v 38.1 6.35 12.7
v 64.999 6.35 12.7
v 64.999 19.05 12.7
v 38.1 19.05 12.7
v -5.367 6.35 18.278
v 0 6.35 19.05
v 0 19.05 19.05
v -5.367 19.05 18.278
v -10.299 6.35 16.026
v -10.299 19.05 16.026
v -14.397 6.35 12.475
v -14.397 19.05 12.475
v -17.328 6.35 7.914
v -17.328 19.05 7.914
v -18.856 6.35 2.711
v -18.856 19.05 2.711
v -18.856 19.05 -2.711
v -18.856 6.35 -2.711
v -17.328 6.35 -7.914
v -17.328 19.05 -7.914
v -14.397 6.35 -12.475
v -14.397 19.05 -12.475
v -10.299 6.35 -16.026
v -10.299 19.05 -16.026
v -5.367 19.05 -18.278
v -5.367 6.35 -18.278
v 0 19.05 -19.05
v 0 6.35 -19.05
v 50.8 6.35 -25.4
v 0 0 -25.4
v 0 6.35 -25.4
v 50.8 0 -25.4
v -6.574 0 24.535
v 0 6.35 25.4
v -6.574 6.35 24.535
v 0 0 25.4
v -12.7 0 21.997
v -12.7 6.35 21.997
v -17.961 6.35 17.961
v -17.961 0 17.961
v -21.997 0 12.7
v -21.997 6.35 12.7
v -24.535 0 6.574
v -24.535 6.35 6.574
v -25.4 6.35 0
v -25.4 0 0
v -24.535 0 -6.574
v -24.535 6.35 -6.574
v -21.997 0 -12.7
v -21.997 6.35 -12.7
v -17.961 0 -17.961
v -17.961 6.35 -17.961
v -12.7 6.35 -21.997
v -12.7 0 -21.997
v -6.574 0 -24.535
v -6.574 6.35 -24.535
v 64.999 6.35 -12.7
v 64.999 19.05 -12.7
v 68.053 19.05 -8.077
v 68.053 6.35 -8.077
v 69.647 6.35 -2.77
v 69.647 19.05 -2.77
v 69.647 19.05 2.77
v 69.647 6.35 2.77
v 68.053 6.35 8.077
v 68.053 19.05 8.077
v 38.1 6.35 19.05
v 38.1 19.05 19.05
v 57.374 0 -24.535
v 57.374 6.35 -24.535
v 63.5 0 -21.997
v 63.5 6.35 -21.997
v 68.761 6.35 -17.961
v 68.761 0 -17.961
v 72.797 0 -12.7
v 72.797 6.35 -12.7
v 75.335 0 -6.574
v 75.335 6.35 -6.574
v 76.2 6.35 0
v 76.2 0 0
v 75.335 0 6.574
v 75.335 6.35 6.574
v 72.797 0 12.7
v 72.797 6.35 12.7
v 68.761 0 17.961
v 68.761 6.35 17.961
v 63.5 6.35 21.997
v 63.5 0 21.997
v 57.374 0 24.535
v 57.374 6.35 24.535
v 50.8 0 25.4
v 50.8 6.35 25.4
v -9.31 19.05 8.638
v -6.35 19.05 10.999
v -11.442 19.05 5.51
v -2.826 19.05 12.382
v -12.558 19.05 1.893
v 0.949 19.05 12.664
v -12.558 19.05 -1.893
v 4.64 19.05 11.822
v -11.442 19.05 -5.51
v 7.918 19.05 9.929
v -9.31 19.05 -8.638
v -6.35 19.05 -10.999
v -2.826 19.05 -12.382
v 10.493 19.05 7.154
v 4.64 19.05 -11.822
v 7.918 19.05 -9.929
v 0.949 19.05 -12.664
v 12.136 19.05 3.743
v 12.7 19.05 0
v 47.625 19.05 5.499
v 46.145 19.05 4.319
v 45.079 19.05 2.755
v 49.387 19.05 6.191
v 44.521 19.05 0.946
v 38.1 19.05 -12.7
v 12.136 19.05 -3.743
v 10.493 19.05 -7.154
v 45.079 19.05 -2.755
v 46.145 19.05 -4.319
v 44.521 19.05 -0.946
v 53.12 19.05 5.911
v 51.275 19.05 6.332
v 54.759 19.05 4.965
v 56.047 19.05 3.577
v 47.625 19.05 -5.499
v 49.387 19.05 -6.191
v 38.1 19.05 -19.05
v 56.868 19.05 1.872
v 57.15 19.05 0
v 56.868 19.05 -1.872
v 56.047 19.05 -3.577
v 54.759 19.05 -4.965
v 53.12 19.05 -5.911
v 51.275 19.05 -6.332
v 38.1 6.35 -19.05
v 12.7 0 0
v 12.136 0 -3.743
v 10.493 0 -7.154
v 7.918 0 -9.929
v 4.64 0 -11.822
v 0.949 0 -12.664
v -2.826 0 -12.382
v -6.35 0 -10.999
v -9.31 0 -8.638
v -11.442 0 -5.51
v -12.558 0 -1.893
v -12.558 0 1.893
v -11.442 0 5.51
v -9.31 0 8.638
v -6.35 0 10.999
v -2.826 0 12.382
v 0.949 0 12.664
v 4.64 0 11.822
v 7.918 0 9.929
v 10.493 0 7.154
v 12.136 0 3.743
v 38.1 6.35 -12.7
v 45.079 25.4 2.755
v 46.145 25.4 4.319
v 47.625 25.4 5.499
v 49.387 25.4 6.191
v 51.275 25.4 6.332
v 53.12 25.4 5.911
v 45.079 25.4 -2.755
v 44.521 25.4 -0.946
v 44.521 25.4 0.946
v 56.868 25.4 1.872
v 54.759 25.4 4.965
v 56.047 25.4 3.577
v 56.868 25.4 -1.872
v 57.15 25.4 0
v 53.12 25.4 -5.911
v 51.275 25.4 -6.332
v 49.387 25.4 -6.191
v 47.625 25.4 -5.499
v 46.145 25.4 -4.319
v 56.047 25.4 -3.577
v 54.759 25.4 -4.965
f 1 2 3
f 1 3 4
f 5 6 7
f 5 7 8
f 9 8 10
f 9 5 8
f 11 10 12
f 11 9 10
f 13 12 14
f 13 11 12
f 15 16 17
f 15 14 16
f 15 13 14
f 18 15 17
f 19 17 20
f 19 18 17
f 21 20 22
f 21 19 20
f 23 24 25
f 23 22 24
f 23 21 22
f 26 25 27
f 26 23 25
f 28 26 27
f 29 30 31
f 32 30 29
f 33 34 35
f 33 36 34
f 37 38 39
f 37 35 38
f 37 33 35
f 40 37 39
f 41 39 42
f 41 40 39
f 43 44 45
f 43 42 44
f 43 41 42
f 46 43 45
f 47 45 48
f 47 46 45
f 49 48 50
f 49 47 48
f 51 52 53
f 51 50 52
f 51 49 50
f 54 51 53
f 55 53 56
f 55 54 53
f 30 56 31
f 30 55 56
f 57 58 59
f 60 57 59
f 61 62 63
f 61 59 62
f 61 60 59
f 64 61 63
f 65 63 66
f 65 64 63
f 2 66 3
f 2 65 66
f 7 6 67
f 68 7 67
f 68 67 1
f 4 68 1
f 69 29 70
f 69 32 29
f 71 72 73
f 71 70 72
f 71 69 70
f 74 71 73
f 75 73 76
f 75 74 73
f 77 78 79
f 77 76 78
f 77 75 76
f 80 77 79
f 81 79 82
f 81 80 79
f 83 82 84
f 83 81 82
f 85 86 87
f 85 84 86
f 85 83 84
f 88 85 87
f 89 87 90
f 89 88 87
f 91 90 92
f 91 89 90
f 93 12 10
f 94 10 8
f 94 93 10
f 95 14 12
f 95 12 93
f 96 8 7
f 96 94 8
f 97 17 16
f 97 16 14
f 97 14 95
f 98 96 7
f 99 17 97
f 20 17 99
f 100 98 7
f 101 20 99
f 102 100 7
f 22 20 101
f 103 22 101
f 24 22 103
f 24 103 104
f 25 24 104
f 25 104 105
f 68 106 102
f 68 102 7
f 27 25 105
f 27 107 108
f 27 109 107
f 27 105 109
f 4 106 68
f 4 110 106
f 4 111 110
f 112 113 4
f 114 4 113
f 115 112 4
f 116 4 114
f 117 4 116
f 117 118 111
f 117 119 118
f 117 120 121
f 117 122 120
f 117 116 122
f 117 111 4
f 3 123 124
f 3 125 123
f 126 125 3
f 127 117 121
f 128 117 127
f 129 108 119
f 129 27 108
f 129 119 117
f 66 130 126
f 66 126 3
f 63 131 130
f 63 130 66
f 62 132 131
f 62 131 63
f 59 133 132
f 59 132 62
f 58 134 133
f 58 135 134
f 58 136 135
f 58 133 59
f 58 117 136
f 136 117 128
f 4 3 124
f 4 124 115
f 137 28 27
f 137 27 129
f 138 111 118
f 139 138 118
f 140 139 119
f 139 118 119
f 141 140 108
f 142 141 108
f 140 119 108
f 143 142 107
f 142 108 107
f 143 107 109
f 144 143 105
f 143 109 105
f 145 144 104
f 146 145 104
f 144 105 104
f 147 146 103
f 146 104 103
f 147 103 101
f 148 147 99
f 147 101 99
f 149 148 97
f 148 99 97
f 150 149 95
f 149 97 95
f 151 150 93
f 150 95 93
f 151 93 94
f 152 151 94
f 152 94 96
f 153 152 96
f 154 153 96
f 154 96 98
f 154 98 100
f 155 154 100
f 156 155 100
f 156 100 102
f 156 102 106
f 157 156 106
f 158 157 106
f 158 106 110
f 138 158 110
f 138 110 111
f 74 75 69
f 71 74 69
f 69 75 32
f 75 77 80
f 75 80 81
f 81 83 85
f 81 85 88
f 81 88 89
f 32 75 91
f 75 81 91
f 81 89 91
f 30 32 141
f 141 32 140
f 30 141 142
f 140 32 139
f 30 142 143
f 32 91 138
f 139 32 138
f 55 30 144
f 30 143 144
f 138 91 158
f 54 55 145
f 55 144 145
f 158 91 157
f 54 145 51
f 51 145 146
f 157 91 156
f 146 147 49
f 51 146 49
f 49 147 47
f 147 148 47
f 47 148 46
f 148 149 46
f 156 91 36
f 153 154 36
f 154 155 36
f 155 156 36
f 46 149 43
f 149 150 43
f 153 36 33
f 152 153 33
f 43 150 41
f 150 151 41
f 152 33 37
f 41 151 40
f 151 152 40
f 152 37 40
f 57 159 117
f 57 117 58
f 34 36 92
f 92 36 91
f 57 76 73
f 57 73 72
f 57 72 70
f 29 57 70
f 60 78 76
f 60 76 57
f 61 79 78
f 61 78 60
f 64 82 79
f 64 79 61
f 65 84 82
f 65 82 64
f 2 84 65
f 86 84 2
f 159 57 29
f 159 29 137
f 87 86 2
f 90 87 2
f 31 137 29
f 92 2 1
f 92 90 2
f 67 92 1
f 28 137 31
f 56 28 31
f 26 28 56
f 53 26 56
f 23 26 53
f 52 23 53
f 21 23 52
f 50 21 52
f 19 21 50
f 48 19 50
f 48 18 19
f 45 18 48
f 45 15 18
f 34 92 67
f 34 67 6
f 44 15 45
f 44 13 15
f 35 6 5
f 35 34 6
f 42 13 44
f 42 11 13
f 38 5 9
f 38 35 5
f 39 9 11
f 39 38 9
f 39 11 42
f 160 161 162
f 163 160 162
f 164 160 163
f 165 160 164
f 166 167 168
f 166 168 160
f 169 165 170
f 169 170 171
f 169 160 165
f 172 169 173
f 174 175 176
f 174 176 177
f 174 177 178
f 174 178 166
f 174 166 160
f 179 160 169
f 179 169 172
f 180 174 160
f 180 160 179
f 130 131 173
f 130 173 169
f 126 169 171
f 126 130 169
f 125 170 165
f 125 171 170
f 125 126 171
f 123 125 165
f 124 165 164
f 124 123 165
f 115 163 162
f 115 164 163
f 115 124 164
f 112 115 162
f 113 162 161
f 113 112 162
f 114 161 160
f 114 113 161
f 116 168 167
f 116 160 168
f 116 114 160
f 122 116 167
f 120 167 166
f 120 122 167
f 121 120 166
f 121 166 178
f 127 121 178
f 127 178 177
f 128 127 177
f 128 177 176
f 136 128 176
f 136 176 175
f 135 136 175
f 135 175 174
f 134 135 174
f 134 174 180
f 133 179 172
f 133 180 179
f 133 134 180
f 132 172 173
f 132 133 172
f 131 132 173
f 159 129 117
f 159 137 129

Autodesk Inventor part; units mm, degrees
ref_plane "YZ Plane" through (0, 0, 0) normal (1, 0, 0) x (0, 1, 0)
ref_plane "XZ Plane" through (0, 0, 0) normal (0, 1, 0) x (-1, 0, 0)
ref_plane "XY Plane" through (0, 0, 0) normal (0, 0, 1) x (1, 0, 0)
sketch "Sketch1" plane through (0, 0, 0) normal (0, 1, 0) x (-1, 0, 0)
  arc A0 (0, -25.4) -> (0, 25.4) centre (0, 0) ccw
  arc A1 (-50.8, 25.4) -> (-50.8, -25.4) centre (-50.8, 0) ccw
  line L0 (0, 25.4) -> (-50.8, 25.4)
  line L1 (0, -25.4) -> (-50.8, -25.4)
  dimension "d0" = 50.8
extrude "Extrusion1" add sketch "Sketch1" along normal blind 6.35
sketch "Sketch2" plane through (0, 6.35, 0) normal (0, 1, 0) x (1, 0, 0)
  arc A0 (0, 19.05) -> (0, -19.05) centre (0, 0) ccw
  line L0 (0, 19.05) -> (38.1, 19.05)
  line L1 (0, -19.05) -> (38.1, -19.05)
  arc A1 (50.8, -25.4) -> (50.8, 25.4) centre (50.8, 0) ccw projected
  arc A2 (64.999, -12.7) -> (64.999, 12.7) centre (50.8, 0) ccw
  line L2 (50.8, 12.7) -> (64.999, 12.7)
  line L3 (50.8, -12.7) -> (64.999, -12.7)
  line L4 (50.8, -12.7) -> (38.1, -12.7)
  line L5 (50.8, 12.7) -> (38.1, 12.7)
  line L6 (38.1, 19.05) -> (38.1, 12.7)
  line L7 (38.1, -19.05) -> (38.1, -12.7)
  dimension "d6" = 38.1
  dimension "d7" = 38.1
extrude "Extrusion2" add sketch "Sketch2" along normal blind 12.7
sketch "Sketch3" plane through (0, 19.05, 0) normal (0, 1, 0) x (1, 0, 0)
  circle A0 centre (0, 0) radius 12.7
  dimension "d13" = 25.4
extrude "Extrusion3" cut sketch "Sketch3" against normal blind 25.4
sketch "Sketch4" plane through (0, 19.05, 0) normal (0, 1, 0) x (1, 0, 0)
  arc A0 (64.999, -12.7) -> (64.999, 12.7) centre (50.8, 0) ccw projected
  circle A1 centre (50.8, 0) radius 6.35
  point P0 (0, 0)
  dimension "d16" = 12.7
extrude "Extrusion4" add sketch "Sketch4" along normal blind 6.35
